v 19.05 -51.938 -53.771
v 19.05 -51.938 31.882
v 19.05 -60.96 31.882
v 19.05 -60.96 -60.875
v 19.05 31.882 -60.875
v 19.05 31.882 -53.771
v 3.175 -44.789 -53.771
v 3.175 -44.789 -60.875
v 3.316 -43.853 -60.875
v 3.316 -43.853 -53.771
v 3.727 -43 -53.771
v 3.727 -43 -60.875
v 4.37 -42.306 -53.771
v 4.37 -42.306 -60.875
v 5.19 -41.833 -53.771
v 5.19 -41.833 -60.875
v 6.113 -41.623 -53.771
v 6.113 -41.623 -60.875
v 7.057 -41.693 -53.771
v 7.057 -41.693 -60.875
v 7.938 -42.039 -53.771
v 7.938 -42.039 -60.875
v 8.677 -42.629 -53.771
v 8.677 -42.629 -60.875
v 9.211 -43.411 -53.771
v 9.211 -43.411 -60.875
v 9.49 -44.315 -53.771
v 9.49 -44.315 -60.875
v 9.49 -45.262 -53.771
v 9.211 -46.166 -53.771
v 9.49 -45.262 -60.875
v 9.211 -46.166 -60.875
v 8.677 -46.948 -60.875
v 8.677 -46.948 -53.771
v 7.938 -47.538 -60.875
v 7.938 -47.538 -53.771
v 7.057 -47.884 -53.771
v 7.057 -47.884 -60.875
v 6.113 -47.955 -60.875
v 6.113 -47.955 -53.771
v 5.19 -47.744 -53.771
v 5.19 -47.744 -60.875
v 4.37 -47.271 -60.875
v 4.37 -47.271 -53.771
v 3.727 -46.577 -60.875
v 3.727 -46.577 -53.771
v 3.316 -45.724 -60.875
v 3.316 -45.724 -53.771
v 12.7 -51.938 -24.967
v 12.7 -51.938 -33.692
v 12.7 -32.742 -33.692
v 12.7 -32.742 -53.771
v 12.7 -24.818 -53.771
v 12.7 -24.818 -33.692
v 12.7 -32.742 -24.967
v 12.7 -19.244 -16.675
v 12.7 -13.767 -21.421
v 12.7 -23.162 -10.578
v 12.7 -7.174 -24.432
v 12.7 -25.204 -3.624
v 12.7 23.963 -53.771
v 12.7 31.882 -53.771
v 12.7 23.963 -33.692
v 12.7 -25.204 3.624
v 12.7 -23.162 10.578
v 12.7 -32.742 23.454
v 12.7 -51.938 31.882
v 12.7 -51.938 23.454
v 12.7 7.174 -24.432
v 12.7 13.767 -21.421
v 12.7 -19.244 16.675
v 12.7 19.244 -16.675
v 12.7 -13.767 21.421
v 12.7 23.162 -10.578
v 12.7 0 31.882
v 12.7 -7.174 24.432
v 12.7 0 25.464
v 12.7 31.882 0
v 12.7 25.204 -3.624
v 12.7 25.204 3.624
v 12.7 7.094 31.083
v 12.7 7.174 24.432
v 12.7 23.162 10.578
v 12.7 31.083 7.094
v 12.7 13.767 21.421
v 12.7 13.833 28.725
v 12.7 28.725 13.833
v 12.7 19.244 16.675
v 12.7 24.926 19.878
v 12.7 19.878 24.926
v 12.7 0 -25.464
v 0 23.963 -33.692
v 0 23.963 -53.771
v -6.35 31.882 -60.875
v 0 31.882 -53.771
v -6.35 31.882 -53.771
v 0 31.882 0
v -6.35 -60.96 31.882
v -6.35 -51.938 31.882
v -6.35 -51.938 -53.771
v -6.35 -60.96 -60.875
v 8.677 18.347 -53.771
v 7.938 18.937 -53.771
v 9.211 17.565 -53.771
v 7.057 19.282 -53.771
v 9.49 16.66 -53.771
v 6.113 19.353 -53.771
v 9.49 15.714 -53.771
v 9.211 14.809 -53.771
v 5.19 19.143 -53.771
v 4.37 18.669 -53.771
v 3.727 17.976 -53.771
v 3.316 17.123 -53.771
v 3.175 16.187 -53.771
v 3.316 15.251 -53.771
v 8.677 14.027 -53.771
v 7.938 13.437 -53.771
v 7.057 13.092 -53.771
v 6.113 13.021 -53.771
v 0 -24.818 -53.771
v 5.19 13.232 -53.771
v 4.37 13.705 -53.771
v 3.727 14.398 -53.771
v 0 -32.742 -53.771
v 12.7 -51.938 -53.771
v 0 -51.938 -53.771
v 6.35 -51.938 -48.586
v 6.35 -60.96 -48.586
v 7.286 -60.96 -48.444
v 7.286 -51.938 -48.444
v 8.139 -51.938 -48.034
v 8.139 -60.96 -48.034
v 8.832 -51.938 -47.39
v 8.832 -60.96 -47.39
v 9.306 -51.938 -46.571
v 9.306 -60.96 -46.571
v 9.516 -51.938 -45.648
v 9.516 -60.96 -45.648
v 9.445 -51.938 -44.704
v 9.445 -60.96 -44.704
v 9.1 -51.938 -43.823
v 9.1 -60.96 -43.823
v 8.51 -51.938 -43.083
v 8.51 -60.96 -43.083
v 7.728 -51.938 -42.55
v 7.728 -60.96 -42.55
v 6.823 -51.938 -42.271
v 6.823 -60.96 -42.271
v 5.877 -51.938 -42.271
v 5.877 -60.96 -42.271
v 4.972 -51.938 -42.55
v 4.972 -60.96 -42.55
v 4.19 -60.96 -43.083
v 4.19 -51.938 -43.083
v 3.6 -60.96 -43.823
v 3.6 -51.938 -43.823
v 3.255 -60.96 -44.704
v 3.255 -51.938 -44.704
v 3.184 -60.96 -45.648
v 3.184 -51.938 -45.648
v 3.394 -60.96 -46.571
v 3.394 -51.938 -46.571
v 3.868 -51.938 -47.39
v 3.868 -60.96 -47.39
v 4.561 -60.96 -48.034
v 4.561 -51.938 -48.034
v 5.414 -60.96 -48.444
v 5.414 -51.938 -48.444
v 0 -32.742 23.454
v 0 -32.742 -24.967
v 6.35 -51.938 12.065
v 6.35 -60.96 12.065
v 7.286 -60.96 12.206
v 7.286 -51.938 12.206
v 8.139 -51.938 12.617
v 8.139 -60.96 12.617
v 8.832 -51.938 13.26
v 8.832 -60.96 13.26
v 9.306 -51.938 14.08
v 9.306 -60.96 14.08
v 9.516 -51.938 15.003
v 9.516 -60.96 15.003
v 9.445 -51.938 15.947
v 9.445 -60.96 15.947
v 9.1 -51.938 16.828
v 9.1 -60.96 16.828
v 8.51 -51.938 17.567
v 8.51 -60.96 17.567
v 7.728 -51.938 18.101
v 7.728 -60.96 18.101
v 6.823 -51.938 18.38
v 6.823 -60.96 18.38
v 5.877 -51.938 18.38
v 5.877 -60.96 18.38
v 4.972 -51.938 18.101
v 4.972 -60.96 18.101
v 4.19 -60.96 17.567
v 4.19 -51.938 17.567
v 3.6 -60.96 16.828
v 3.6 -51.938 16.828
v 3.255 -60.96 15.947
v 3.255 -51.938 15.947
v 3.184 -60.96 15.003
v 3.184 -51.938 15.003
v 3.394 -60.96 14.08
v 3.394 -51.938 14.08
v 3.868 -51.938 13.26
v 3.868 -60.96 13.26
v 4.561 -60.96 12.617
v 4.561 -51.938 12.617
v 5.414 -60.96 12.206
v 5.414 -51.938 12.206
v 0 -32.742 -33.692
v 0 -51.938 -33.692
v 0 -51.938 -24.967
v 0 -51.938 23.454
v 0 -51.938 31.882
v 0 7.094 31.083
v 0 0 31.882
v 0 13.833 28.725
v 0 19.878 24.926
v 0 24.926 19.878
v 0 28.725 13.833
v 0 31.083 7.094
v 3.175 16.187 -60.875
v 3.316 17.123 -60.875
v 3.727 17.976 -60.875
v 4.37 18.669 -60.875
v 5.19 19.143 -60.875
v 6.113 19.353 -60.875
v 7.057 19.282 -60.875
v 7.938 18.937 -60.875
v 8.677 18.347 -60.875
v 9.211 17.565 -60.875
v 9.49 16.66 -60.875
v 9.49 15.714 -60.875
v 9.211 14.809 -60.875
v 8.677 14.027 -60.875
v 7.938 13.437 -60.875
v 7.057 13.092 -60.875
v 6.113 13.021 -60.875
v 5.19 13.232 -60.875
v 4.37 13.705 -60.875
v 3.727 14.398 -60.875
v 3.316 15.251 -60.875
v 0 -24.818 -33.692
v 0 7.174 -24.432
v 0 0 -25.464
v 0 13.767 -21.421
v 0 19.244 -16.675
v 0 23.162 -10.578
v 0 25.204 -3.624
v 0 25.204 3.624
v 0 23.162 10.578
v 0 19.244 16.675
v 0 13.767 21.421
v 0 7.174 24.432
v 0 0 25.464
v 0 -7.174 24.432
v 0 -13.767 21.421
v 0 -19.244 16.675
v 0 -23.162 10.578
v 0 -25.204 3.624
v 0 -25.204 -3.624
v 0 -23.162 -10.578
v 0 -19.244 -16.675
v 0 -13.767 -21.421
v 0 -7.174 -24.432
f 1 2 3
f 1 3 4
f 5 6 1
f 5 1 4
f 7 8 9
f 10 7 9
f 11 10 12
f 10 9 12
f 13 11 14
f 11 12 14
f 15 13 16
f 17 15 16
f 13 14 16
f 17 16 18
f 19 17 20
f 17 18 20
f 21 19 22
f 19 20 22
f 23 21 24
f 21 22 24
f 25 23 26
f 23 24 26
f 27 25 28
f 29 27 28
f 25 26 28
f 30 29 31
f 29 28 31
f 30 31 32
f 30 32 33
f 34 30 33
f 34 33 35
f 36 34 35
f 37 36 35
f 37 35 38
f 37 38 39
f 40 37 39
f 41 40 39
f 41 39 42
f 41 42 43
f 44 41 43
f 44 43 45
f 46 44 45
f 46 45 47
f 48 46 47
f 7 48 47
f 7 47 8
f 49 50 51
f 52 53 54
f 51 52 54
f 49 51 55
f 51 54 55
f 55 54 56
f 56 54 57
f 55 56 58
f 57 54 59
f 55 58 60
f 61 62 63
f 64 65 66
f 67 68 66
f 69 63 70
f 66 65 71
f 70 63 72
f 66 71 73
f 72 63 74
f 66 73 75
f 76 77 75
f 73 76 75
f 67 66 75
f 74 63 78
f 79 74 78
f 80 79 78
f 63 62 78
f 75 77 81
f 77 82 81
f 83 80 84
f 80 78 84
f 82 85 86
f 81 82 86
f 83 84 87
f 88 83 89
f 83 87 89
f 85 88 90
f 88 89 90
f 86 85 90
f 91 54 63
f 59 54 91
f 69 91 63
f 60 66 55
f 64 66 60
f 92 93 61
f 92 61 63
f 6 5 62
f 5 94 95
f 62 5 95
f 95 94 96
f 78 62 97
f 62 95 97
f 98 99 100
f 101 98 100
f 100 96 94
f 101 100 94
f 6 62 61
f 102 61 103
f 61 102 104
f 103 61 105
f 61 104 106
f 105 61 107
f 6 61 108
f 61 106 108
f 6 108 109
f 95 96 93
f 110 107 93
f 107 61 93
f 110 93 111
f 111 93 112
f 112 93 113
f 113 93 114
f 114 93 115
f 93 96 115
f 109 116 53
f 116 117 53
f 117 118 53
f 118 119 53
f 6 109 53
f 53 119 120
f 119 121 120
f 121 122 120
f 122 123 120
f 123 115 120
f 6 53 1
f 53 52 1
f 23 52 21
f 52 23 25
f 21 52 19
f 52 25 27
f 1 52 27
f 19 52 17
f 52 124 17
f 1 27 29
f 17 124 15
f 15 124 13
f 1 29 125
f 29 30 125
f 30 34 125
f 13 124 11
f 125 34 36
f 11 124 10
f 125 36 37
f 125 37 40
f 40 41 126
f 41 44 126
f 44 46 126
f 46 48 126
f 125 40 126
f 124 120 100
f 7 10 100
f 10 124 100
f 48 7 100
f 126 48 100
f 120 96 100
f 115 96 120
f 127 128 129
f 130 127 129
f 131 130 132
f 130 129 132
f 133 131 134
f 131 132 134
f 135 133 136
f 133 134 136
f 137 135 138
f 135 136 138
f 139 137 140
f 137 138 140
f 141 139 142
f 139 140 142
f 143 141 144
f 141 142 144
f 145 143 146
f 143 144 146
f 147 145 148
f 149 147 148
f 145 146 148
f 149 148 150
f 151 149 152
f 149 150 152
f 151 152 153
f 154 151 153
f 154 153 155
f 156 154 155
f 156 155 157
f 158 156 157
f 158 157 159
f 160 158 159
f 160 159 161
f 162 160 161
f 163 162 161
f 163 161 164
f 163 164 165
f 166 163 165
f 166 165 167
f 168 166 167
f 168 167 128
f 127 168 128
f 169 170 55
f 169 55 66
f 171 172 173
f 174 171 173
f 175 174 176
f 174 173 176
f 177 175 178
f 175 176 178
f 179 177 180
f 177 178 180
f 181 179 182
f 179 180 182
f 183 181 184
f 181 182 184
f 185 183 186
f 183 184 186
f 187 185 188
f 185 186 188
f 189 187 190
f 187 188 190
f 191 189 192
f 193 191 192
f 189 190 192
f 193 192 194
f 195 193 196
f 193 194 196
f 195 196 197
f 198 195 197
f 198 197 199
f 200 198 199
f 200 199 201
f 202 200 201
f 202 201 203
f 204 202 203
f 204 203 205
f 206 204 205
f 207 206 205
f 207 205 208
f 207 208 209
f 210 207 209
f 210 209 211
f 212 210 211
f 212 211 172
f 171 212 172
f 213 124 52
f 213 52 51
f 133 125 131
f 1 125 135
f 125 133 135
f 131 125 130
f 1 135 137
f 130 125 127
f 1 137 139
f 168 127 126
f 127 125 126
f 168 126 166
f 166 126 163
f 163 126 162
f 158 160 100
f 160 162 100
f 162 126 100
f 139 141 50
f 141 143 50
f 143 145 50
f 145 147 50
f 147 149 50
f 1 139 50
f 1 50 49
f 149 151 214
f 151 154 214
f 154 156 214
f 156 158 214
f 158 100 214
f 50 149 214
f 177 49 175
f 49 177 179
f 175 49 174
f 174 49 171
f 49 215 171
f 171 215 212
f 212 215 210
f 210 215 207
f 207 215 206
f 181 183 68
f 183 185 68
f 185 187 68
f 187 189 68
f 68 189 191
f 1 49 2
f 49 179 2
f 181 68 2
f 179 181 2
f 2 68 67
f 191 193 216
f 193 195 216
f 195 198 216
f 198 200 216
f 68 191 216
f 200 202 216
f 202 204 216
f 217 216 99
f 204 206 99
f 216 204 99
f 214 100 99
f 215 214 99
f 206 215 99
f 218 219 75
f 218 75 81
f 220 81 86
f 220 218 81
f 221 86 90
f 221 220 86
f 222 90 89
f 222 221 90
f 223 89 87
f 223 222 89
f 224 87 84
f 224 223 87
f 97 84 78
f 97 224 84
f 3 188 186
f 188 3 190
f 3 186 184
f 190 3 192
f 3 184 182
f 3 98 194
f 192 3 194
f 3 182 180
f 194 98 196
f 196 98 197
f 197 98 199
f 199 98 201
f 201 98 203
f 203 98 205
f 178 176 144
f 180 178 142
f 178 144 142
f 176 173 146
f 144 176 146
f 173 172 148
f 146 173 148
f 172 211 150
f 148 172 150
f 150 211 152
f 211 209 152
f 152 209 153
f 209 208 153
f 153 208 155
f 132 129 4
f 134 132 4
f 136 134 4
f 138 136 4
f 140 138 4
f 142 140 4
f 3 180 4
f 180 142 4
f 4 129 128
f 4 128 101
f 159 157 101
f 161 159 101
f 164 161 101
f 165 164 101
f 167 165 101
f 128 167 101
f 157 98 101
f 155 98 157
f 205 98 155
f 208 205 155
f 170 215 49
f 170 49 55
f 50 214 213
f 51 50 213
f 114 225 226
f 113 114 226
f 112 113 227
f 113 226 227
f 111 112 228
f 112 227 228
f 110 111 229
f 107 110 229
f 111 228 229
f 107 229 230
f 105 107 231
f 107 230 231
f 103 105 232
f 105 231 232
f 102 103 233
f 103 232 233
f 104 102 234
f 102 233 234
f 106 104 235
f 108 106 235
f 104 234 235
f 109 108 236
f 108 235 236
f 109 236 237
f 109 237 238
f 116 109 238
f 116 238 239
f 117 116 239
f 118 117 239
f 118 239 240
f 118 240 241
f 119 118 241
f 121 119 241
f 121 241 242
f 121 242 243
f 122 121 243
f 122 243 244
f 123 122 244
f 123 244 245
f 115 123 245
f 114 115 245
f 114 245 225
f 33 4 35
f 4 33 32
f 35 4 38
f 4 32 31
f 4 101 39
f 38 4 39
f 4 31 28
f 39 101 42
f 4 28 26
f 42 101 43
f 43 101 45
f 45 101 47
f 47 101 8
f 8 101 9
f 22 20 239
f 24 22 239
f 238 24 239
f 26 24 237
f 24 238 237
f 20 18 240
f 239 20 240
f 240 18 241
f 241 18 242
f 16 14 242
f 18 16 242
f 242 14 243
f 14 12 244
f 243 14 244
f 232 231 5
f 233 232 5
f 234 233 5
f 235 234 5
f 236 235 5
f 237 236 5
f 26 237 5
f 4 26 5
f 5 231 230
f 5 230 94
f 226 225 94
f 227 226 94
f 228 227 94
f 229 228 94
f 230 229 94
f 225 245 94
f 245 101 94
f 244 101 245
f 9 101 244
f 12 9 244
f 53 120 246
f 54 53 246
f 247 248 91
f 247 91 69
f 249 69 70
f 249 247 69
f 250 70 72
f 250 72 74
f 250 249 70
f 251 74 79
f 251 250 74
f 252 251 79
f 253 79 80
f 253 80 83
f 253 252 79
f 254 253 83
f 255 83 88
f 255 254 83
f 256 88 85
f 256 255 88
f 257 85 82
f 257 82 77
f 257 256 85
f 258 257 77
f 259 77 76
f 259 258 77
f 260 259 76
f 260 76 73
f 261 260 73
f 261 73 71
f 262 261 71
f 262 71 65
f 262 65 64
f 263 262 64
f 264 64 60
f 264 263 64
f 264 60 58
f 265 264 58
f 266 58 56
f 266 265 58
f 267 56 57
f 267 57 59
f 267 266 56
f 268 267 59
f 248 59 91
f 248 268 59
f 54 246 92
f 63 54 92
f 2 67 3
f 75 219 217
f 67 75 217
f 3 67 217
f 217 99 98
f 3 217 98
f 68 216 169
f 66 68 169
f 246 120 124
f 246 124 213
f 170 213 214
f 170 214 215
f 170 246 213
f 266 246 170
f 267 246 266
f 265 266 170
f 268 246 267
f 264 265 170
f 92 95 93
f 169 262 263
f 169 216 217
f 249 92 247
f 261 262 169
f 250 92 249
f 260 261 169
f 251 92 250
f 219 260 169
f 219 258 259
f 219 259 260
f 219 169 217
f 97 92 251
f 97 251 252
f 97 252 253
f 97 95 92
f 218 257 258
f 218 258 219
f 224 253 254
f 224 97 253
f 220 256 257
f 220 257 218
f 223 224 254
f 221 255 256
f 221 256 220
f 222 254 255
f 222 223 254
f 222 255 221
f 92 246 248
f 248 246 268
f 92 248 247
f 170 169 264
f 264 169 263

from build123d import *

# Parameters (mm, degrees)
SKETCH1_R                = 25.4635
BOSS_EXTRUDE1_DEPTH      = 12.7
BOSS_EXTRUDE2_DEPTH      = 6.35
BOSS_EXTRUDE2_DEPTH_BACK = 19.05
SKETCH4_W                = 20.078494948
SKETCH4_H                = 48.78095735
SKETCH4_W_2              = 48.420880553
SKETCH4_H_2              = 19.195923741
CUT_EXTRUDE2_DEPTH       = 26.162
SKETCH5_R                = 3.175
CUT_EXTRUDE3_DEPTH       = 11.43
SKETCH6_R                = 3.175
CUT_EXTRUDE4_DEPTH       = 11.43


with BuildPart() as part:
    # Sketch1 → Boss-Extrude1 (new body)
    with BuildSketch(Plane(origin=(0, 0, 0), x_dir=(0, 0, -1), z_dir=(1, 0, 0))):
        with BuildLine():
            Line((0, 31.882172919), (31.882172919, 31.882172919))
            Line((31.882172919, 31.882172919), (60.87463474, 31.882172919))
            Line((60.87463474, 31.882172919), (60.87463474, -60.96))
            Line((60.87463474, -60.96), (-31.882172919, -60.96))
            Line((-31.882172919, -60.96), (-31.882172919, 0))
            ThreePointArc((-31.882172919, 0), (-22.54410067, 22.54410067), (0, 31.882172919))
        make_face()
        Circle(SKETCH1_R, mode=Mode.SUBTRACT)
    extrude(amount=BOSS_EXTRUDE1_DEPTH)

    # Sketch8 → Boss-Extrude2 (add, two sides: drawn at the far end of the back side and taken through both)
    with BuildSketch(Plane(origin=(12.7, 0, 0), x_dir=(0, 0, -1), z_dir=(1, 0, 0)).offset(-BOSS_EXTRUDE2_DEPTH_BACK)):
        Polygon((60.87463474, 31.882172919), (53.770648903, 31.882172919), (53.770648903, -51.937867719), (-31.882172919, -51.937867719), (-31.882172919, -60.96), (53.770648903, -60.96), (60.87463474, -60.96), align=None)
    extrude(amount=BOSS_EXTRUDE2_DEPTH + BOSS_EXTRUDE2_DEPTH_BACK)

    # Sketch4 → Cut-Extrude2 (cut)
    with BuildSketch(Plane.ZY):
        with Locations((-43.731401429, -0.427222634)):
            Rectangle(SKETCH4_W, SKETCH4_H)
        with Locations((-0.75610861, -42.339905849)):
            Rectangle(SKETCH4_W_2, SKETCH4_H_2)
        with Locations((-43.731401429, -42.339905849)):
            Rectangle(SKETCH4_W, SKETCH4_H_2)
    extrude(amount=-CUT_EXTRUDE2_DEPTH, mode=Mode.SUBTRACT)

    # Sketch5 → Cut-Extrude3 (cut)
    with BuildSketch(Plane(origin=(0, 0, -60.87463474), x_dir=(-1, 0, 0), z_dir=(0, 0, -1))):
        with Locations((-6.35, 16.187024645)):
            Circle(SKETCH5_R)
        with Locations((-6.35, -44.788648077)):
            Circle(SKETCH5_R)
    extrude(amount=-CUT_EXTRUDE3_DEPTH, mode=Mode.SUBTRACT)

    # Sketch6 → Cut-Extrude4 (cut)
    with BuildSketch(Plane.XZ.offset(60.96)):
        with Locations((6.35, 15.24)):
            Circle(SKETCH6_R)
        with Locations((6.35, -45.41055385)):
            Circle(SKETCH6_R)
    extrude(amount=-CUT_EXTRUDE4_DEPTH, mode=Mode.SUBTRACT)


solid = part.part
